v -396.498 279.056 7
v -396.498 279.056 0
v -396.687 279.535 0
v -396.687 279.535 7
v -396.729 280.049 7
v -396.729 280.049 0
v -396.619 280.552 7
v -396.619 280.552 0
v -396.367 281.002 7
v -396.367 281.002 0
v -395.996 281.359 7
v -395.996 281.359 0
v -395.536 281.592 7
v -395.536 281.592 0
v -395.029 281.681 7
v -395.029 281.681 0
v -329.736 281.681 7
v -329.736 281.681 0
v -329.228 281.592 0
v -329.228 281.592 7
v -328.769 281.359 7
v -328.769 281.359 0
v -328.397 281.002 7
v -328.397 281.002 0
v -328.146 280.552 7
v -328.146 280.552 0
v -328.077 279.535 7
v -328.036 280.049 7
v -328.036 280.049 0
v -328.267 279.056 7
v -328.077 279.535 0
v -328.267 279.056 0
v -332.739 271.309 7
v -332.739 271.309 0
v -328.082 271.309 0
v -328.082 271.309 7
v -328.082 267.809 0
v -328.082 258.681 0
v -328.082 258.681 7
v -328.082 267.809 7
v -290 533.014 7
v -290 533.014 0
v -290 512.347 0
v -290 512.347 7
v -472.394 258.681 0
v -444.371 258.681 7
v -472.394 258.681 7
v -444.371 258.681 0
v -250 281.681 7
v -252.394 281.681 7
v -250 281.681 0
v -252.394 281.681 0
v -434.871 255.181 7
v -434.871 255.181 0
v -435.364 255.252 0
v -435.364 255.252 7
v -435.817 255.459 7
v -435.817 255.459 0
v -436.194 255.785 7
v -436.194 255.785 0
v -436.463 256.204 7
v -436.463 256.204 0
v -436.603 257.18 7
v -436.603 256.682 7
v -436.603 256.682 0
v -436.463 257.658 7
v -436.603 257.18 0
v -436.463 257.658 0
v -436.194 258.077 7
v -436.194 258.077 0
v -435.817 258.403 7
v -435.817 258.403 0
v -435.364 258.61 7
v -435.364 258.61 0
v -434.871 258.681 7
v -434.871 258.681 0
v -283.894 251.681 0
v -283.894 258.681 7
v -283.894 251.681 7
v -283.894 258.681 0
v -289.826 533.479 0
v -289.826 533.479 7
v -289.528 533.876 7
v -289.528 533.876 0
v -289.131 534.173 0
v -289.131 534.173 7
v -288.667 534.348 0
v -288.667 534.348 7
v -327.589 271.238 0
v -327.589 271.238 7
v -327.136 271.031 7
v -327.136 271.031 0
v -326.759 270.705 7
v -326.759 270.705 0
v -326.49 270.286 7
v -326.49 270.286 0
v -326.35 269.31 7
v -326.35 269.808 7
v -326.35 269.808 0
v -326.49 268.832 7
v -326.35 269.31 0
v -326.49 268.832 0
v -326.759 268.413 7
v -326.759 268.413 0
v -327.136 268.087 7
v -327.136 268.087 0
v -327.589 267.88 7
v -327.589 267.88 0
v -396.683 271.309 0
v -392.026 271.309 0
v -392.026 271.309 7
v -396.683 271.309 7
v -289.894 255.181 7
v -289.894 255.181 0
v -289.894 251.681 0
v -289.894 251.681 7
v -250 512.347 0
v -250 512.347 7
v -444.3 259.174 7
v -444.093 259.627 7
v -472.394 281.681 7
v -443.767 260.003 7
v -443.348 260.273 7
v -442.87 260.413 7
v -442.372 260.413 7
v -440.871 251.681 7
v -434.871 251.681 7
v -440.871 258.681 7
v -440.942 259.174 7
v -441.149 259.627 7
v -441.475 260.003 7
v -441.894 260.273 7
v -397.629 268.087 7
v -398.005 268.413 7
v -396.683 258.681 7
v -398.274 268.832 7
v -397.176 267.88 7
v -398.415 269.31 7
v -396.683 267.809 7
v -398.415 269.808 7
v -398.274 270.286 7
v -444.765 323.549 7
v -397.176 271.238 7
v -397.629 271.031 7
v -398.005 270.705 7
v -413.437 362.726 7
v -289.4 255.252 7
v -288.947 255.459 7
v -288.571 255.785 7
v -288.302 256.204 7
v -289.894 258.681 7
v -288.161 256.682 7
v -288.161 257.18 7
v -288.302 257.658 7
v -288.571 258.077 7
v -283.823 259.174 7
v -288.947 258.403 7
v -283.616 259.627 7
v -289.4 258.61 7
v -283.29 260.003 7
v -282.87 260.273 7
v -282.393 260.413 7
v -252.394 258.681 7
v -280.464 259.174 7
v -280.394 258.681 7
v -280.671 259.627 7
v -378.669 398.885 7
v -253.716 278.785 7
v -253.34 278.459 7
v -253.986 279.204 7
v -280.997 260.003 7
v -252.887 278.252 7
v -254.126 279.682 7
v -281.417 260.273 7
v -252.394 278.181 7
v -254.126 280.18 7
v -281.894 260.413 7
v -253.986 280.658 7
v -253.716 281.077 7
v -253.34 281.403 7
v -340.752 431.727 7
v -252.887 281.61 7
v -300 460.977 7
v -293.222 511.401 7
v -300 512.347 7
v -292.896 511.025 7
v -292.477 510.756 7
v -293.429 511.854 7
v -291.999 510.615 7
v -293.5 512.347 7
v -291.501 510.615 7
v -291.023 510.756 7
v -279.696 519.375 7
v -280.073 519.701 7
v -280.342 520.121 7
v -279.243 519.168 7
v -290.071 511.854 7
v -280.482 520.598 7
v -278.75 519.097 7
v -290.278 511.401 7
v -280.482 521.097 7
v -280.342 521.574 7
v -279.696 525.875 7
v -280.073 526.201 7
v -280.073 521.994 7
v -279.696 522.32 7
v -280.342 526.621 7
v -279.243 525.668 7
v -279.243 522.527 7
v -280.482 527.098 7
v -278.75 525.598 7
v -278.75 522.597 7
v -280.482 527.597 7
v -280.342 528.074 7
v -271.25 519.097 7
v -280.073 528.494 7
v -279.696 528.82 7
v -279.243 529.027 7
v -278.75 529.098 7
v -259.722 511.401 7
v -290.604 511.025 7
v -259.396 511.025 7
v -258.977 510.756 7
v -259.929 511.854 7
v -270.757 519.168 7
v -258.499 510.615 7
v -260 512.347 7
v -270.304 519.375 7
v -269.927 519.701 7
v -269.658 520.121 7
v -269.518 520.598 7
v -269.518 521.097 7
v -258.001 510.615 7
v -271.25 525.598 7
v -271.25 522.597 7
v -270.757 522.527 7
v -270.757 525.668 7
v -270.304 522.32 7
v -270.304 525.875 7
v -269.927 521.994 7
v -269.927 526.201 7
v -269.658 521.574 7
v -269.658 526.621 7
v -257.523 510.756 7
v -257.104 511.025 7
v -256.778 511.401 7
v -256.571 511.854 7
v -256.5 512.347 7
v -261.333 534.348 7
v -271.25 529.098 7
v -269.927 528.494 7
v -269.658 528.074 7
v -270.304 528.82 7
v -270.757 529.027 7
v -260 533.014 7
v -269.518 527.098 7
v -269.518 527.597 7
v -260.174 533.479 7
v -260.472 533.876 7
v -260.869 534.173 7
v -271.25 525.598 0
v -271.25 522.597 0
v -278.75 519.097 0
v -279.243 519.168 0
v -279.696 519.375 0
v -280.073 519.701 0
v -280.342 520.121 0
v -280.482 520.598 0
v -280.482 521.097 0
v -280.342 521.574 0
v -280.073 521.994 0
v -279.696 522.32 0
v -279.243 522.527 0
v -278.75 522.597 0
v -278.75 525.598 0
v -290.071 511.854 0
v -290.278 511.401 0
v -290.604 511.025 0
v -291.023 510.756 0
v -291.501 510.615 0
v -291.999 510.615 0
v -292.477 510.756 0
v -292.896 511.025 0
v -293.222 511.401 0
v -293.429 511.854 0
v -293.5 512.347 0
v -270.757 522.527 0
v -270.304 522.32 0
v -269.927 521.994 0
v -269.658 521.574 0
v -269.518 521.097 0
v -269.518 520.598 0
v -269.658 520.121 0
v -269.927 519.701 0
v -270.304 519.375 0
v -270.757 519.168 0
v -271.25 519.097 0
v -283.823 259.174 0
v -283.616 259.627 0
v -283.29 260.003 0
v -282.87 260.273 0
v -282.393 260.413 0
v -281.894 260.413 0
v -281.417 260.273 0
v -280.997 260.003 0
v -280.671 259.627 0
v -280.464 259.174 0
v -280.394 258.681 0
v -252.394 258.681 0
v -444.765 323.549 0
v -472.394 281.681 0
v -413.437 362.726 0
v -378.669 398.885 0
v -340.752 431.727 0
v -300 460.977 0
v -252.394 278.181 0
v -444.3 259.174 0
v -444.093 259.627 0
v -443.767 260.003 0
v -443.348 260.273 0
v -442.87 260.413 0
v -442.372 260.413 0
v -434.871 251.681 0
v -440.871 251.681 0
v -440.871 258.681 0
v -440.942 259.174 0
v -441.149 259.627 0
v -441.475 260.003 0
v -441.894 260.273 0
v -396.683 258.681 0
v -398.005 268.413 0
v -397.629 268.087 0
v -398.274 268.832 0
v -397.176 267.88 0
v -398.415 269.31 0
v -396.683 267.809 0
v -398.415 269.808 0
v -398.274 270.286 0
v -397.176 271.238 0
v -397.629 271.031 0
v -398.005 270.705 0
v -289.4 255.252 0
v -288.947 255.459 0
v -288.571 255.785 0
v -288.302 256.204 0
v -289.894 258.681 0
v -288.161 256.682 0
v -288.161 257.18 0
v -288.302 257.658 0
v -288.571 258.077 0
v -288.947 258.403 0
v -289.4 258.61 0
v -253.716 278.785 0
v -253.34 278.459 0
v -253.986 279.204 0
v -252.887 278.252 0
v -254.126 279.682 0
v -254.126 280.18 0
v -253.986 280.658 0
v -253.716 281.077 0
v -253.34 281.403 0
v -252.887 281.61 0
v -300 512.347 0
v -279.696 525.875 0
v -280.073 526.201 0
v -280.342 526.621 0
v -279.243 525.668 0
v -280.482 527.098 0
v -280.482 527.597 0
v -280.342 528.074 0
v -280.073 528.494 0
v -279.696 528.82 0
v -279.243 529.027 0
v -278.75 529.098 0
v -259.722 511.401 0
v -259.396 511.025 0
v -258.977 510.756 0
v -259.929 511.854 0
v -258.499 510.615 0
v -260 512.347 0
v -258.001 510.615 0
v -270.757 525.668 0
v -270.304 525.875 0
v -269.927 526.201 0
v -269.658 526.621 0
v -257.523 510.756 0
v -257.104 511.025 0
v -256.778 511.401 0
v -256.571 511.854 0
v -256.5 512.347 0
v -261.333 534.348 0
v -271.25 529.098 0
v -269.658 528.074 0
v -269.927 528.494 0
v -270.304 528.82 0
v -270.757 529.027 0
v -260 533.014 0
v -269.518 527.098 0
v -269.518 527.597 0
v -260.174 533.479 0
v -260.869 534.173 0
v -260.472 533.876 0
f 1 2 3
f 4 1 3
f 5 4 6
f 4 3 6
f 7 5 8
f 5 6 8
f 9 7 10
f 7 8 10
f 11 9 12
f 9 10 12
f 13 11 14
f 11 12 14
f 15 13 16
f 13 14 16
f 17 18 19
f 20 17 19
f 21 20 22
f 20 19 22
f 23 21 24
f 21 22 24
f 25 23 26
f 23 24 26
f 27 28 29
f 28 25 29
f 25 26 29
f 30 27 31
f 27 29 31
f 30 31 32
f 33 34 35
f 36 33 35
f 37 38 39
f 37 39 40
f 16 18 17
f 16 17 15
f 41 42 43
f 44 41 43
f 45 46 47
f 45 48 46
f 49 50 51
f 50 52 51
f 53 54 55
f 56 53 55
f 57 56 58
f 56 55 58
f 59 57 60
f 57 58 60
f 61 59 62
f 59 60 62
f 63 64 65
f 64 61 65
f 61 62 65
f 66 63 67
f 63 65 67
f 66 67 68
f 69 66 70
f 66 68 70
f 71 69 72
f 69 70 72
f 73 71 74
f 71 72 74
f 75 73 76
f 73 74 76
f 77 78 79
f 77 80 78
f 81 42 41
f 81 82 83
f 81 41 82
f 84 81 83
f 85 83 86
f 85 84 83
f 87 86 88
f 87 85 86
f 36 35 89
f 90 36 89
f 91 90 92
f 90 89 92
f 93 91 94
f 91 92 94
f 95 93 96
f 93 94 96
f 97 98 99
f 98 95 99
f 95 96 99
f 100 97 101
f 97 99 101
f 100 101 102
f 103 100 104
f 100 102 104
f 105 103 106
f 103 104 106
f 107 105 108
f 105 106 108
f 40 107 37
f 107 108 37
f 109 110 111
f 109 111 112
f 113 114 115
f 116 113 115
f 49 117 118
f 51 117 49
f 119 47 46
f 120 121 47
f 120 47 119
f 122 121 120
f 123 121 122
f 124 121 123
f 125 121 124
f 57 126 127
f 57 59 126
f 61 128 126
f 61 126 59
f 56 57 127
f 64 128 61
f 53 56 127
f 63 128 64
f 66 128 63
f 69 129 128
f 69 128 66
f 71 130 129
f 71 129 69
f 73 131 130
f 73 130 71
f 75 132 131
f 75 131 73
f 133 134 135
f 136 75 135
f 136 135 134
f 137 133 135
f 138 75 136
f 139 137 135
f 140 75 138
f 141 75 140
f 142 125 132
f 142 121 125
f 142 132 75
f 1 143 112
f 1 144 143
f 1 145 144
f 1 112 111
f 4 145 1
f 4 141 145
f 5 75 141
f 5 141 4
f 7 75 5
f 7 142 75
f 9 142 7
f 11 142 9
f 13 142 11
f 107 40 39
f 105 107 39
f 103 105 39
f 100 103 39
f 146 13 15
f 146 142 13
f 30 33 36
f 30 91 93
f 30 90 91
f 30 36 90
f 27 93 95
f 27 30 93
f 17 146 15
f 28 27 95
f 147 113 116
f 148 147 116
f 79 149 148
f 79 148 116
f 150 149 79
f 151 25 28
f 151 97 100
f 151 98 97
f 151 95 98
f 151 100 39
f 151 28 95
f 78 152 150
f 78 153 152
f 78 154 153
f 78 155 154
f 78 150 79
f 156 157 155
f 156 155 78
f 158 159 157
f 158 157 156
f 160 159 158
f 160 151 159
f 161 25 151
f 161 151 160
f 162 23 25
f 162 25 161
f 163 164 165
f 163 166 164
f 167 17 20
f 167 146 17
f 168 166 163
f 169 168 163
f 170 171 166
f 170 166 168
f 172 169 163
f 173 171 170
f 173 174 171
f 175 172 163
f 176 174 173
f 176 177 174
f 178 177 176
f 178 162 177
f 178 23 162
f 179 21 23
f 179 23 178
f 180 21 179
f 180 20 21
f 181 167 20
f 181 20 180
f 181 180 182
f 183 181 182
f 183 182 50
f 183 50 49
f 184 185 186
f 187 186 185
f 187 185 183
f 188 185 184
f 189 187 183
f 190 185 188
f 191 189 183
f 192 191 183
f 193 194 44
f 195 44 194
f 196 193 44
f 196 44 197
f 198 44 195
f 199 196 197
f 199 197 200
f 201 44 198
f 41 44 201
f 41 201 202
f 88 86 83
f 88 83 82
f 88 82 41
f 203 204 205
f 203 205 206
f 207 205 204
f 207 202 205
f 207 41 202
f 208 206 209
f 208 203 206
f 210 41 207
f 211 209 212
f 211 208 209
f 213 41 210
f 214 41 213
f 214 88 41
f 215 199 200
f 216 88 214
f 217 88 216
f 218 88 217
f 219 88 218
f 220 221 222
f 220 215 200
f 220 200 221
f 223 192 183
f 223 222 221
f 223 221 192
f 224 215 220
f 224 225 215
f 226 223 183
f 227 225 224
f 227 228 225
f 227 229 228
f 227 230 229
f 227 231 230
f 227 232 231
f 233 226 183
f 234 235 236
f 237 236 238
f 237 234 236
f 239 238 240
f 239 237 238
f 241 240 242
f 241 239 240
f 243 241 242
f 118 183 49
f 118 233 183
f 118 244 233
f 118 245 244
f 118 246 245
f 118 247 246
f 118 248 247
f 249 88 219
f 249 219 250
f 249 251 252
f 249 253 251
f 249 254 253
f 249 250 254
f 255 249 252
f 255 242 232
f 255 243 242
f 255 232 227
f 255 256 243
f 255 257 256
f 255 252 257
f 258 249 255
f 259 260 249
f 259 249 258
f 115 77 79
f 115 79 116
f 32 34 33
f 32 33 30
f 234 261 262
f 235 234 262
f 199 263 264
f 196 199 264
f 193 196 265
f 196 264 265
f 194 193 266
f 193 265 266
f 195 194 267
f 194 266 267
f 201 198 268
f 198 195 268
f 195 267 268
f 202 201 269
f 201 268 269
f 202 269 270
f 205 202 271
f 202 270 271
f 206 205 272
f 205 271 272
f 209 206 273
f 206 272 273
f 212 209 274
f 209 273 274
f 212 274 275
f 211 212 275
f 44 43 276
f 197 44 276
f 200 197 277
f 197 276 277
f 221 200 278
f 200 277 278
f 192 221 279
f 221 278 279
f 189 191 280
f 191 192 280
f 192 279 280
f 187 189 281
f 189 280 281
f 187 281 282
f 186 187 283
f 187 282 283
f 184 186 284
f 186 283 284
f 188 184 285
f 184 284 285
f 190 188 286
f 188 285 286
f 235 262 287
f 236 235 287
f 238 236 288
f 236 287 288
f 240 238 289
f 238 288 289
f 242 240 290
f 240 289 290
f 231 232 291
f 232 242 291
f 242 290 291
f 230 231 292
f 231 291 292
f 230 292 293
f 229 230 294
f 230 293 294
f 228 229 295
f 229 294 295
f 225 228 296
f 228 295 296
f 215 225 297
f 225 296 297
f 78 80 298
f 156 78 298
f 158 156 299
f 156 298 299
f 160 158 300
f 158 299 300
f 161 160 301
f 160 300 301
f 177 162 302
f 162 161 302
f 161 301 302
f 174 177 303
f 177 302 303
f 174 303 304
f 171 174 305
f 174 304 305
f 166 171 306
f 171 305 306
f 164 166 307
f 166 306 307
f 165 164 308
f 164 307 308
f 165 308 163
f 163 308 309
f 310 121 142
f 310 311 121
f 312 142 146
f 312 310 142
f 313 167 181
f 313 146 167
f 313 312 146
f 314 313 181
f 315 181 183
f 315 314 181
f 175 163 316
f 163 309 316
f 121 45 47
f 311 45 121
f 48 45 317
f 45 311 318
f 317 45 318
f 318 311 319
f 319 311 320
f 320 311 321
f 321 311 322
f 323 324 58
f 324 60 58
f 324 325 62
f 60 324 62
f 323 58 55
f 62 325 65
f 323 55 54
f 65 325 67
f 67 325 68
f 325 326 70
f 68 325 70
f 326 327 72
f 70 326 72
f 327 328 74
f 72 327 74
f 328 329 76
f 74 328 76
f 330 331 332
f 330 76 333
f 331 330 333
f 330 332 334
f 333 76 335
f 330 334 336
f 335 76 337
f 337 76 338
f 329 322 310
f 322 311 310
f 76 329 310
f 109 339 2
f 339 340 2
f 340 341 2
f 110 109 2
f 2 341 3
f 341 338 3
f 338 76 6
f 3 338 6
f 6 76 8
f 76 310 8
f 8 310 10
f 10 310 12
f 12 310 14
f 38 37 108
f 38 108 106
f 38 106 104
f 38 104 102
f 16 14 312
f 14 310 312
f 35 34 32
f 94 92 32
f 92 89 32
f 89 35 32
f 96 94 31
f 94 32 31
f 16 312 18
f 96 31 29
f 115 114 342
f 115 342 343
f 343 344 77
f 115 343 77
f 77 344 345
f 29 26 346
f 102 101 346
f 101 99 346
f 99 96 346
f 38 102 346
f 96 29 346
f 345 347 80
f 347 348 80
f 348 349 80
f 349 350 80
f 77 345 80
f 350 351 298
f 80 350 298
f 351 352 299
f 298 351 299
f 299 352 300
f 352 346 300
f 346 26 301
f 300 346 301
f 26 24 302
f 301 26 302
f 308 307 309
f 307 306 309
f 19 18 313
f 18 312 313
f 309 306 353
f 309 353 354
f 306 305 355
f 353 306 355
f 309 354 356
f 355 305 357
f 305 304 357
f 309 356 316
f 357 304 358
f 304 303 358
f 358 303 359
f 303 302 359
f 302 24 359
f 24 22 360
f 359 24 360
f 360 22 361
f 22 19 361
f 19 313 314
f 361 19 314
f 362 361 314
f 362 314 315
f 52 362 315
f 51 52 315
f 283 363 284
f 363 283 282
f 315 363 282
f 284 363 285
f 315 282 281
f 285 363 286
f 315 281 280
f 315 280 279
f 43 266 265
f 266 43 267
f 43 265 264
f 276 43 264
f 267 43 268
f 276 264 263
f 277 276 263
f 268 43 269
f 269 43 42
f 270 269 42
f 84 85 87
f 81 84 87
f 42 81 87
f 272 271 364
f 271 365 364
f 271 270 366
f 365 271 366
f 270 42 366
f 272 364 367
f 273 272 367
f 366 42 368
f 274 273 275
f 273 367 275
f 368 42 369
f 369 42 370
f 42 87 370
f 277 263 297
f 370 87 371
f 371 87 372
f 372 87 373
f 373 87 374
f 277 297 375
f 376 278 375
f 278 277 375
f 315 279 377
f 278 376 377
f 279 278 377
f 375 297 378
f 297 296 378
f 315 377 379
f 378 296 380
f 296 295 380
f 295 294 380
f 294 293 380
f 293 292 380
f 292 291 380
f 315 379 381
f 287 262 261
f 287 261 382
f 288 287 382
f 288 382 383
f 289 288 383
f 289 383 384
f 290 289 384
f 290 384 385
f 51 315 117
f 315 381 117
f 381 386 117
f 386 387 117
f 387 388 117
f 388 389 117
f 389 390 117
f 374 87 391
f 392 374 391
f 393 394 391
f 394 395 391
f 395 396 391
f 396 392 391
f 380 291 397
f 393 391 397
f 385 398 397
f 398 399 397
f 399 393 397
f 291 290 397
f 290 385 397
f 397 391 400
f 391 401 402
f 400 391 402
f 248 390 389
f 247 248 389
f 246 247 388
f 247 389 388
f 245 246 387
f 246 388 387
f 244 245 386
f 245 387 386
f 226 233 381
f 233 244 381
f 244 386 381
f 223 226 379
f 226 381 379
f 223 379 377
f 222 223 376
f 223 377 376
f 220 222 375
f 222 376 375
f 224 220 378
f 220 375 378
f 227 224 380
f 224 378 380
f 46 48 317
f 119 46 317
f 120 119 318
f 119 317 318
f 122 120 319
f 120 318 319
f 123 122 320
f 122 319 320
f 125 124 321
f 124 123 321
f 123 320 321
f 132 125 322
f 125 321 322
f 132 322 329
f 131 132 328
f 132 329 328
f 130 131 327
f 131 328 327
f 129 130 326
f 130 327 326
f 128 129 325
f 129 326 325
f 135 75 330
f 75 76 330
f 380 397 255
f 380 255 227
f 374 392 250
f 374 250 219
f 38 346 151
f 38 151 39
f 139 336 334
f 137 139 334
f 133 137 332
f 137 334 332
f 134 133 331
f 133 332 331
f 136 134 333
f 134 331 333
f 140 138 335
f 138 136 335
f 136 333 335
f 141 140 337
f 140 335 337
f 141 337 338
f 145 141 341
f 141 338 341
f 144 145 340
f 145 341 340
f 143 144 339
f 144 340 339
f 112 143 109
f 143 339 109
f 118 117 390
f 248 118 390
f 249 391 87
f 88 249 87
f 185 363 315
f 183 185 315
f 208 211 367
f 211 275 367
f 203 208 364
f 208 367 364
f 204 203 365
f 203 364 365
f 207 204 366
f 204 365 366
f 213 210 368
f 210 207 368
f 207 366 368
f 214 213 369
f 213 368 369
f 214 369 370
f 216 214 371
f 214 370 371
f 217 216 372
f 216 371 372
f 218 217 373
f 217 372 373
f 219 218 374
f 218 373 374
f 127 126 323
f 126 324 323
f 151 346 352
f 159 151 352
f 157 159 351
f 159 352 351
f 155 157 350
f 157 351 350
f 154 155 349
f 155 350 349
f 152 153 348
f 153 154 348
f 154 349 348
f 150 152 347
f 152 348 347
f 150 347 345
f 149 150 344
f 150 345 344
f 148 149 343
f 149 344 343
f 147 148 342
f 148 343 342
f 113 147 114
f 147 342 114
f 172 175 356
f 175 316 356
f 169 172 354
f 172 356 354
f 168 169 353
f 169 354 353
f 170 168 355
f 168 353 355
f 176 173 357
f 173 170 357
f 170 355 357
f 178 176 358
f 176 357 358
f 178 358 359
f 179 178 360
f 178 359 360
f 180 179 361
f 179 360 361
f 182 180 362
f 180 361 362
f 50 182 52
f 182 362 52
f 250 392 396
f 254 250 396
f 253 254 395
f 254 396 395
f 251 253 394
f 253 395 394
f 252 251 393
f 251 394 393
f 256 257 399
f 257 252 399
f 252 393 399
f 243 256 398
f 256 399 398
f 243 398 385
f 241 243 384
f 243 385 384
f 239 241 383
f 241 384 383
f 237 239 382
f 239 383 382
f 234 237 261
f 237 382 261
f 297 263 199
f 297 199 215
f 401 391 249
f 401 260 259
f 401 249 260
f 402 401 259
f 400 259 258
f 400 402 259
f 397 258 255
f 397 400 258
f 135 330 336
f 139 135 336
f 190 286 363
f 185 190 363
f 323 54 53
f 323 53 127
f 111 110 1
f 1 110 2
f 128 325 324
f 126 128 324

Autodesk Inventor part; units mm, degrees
ref_plane "YZ Plane" through (0, 0, 0) normal (1, 0, 0) x (0, 1, 0)
ref_plane "XZ Plane" through (0, 0, 0) normal (0, 1, 0) x (-1, 0, 0)
ref_plane "XY Plane" through (0, 0, 0) normal (0, 0, 1) x (1, 0, 0)
sketch "Sketch1" plane through (0, 0, 0) normal (0, 0, 1) x (1, 0, 0)
  line L0 (-150, -512.3475) -> (-150, -323.3356) construction
  line L1 (-472.3938, -281.6809) -> (-252.3938, -281.6809) construction
  line L2 (-489.0365, 251.6809) -> (-252.3938, 251.6809) construction
  line L3 (-472.3938, 281.6809) -> (-252.3938, 281.6809) construction
  line L4 (-472.3938, -251.6809) -> (-252.3938, -251.6809) construction
  line L5 (-356.435, 15) -> (-576.435, 15) construction
  line L6 (-472.3938, -281.6809) -> (-472.3938, -251.6809) construction
  line L7 (-252.3938, -281.6809) -> (-252.3938, -251.6809) construction
  line L8 (-252.3938, 278.1809) -> (-252.3938, 251.6809) construction
  line L9 (-472.3938, 281.6809) -> (-472.3938, 251.6809) construction
  line L10 (-356.435, 15) -> (-356.435, -15) construction
  line L11 (-356.435, -15) -> (-576.435, -15) construction
  line L12 (-576.435, -15) -> (-576.435, 15) construction
  arc A0 (-150, -323.3356) -> (0, -356.435) centre (0, 0) ccw construction
  arc A1 (-156.5, -512.3475) -> (-160, -512.3475) centre (-158.25, -512.3475) ccw construction
  arc A2 (-190, -512.3475) -> (-193.5, -512.3475) centre (-191.75, -512.3475) ccw construction
  line L13 (-178.75, -519.0975) -> (-175, -519.0975) construction
  line L14 (-178.75, -529.0975) -> (-175, -529.0975) construction
  line L15 (-175, -519.0975) -> (-175, -529.0975) construction
  arc A3 (-178.75, -519.0975) -> (-178.75, -522.5975) centre (-178.75, -520.8475) ccw construction
  arc A4 (-178.75, -525.5975) -> (-178.75, -529.0975) centre (-178.75, -527.3475) ccw construction
  line L16 (-171.25, -519.0975) -> (-175, -519.0975) construction
  line L17 (-171.25, -529.0975) -> (-175, -529.0975) construction
  arc A5 (-171.25, -522.5975) -> (-171.25, -519.0975) centre (-171.25, -520.8475) ccw construction
  arc A6 (-171.25, -529.0975) -> (-171.25, -525.5975) centre (-171.25, -527.3475) ccw construction
  line L18 (-252.3938, 251.6809) -> (-489.0365, 251.6809) construction
  arc A7 (-334.9122, -265.623) -> (-335.582, -268.123) centre (-330.582, -268.123) ccw construction
  line L19 (-328.3782, -254.3059) -> (-334.9122, -265.623) construction
  arc A8 (-328.3782, -254.3059) -> (-329.8938, -251.6809) centre (-329.8938, -253.4309) ccw construction
  line L20 (-329.8938, -251.6809) -> (-394.8938, -251.6809) construction
  line L21 (-362.3938, -251.6809) -> (-362.3938, -293.6041) construction
  arc A9 (-389.2055, -268.123) -> (-389.8754, -265.623) centre (-394.2055, -268.123) ccw construction
  arc A10 (-394.8938, -251.6809) -> (-396.4093, -254.3059) centre (-394.8938, -253.4309) ccw construction
  line L22 (-396.4093, -254.3059) -> (-389.8754, -265.623) construction
  arc A11 (-389.2055, -291.6809) -> (-389.2055, -288.1809) centre (-389.2055, -289.9309) ccw construction
  line L23 (-389.2055, -291.6809) -> (-396.7055, -291.6809) construction
  line L24 (-396.7055, -281.6809) -> (-472.3938, -281.6809) construction
  line L25 (-328.082, -281.6809) -> (-252.3938, -281.6809) construction
  line L26 (-252.3938, -287.3475) -> (-210.8964, -287.3475) construction
  arc A12 (-210.8964, -287.3475) -> (-150, -323.3356) centre (0, 0) ccw construction
  arc A13 (-472.3938, -281.6809) -> (-246.475, -491.6809) centre (0, 0) ccw construction
  line L27 (-171.25, -436.0915) -> (-171.25, -399.5915) construction
  line L28 (-178.75, -436.0915) -> (-178.75, -399.5915) construction
  line L29 (-177, -437.8415) -> (-173, -437.8415) construction
  line L30 (-177, -397.8415) -> (-173, -397.8415) construction
  arc A14 (-177, -397.8415) -> (-178.75, -399.5915) centre (-177, -399.5915) ccw construction
  arc A15 (-178.75, -436.0915) -> (-177, -437.8415) centre (-177, -436.0915) ccw construction
  arc A16 (-173, -437.8415) -> (-171.25, -436.0915) centre (-173, -436.0915) ccw construction
  arc A17 (-171.25, -399.5915) -> (-173, -397.8415) centre (-173, -399.5915) ccw construction
  line L31 (-200, -512.3475) -> (-200, -491.6809) construction
  arc A18 (-200, -491.6809) -> (-203.5, -491.6809) centre (-201.75, -491.6809) ccw construction
  line L32 (-160, -512.3475) -> (-160, -532.5975) construction
  line L33 (-161.75, -534.3475) -> (-188.25, -534.3475) construction
  line L34 (-190, -532.5975) -> (-190, -512.3475) construction
  line L35 (-171.25, -522.5975) -> (-171.25, -525.5975) construction
  line L36 (-178.75, -522.5975) -> (-178.75, -525.5975) construction
  arc A19 (-190, -532.5975) -> (-188.25, -534.3475) centre (-188.25, -532.5975) ccw construction
  arc A20 (-161.75, -534.3475) -> (-160, -532.5975) centre (-161.75, -532.5975) ccw construction
  line L37 (-156.5, -512.3475) -> (-150, -512.3475) construction
  line L38 (-193.5, -512.3475) -> (-200, -512.3475) construction
  line L39 (-203.5, -491.6809) -> (-246.475, -491.6809) construction
  arc A21 (-396.7055, -288.1809) -> (-396.7055, -291.6809) centre (-396.7055, -289.9309) ccw construction
  line L40 (-396.7055, -281.6809) -> (-396.7055, -288.1809) construction
  line L41 (-389.2055, -288.1809) -> (-389.2055, -268.123) construction
  arc A22 (-335.582, -288.1809) -> (-335.582, -291.6809) centre (-335.582, -289.9309) ccw construction
  line L42 (-335.582, -291.6809) -> (-328.082, -291.6809) construction
  arc A23 (-328.082, -291.6809) -> (-328.082, -288.1809) centre (-328.082, -289.9309) ccw construction
  line L43 (-328.082, -281.6809) -> (-328.082, -288.1809) construction
  line L44 (-335.582, -288.1809) -> (-335.582, -268.123) construction
  arc A24 (-252.3938, -283.8475) -> (-252.3938, -287.3475) centre (-252.3938, -285.5975) ccw construction
  line L45 (-252.3938, -283.8475) -> (-252.3938, -281.6809) construction
  arc A25 (-479.7691, -25) -> (-479.7691, -21.5) centre (-479.7691, -23.25) ccw construction
  arc A26 (-479.7691, -1.4421) -> (-480.4389, 1.0579) centre (-484.7691, -1.4421) ccw construction
  line L46 (-486.9729, 12.375) -> (-480.4389, 1.0579) construction
  arc A27 (-485.4573, 15) -> (-486.9729, 12.375) centre (-485.4573, 13.25) ccw construction
  line L47 (-420.4573, 15) -> (-485.4573, 15) construction
  arc A28 (-425.4757, 1.0579) -> (-426.1456, -1.4421) centre (-421.1456, -1.4421) ccw construction
  arc A29 (-418.9418, 12.375) -> (-420.4573, 15) centre (-420.4573, 13.25) ccw construction
  line L48 (-418.9418, 12.375) -> (-425.4757, 1.0579) construction
  line L49 (-452.9573, 15) -> (-452.9573, -26.9232) construction
  line L50 (-479.7691, -25) -> (-487.2691, -25) construction
  line L51 (-487.2691, -15) -> (-549.7954, -15) construction
  arc A30 (-487.2691, -21.5) -> (-487.2691, -25) centre (-487.2691, -23.25) ccw construction
  line L52 (-487.2691, -15) -> (-487.2691, -21.5) construction
  line L53 (-479.7691, -21.5) -> (-479.7691, -1.4421) construction
  line L54 (-426.1456, -21.5) -> (-426.1456, -1.4421) construction
  arc A31 (-426.1456, -21.5) -> (-426.1456, -25) centre (-426.1456, -23.25) ccw construction
  line L55 (-426.1456, -25) -> (-418.6456, -25) construction
  arc A32 (-418.6456, -25) -> (-418.6456, -21.5) centre (-418.6456, -23.25) ccw construction
  line L56 (-418.6456, -15) -> (-418.6456, -21.5) construction
  line L57 (276.2049, -135.3556) -> (280.6774, -127.609)
  line L58 (279.2083, -124.984) -> (246.5502, -124.984)
  arc A33 (319.0505, -151.484) -> (319.0505, -147.984) centre (319.0505, -149.734) ccw
  arc A34 (328.5505, -147.9841) -> (325.0505, -147.9841) centre (326.8005, -147.9841) ccw
  line L59 (319.0505, -147.984) -> (280.8619, -147.984)
  arc A35 (214.0502, -164.7817) -> (212.5346, -167.4067) centre (214.0502, -166.5317) ccw
  arc A36 (280.5657, -167.4067) -> (279.0502, -164.7817) centre (279.0502, -166.5317) ccw
  arc A37 (274.0318, -178.7238) -> (273.3619, -181.2238) centre (278.3619, -181.2238) ccw
  line L60 (280.5657, -167.4067) -> (274.0318, -178.7238)
  line L61 (273.3619, -201.2817) -> (273.3619, -181.2238)
  arc A38 (273.3619, -201.2817) -> (273.3619, -204.7817) centre (273.3619, -203.0317) ccw
  line L62 (273.3619, -204.7817) -> (280.8619, -204.7817)
  arc A39 (280.8619, -204.7817) -> (280.8619, -201.2817) centre (280.8619, -203.0317) ccw
  line L63 (280.8619, -194.7817) -> (280.8619, -201.2817)
  line L64 (212.2384, -194.7817) -> (212.2384, -201.2817)
  arc A40 (212.2384, -201.2817) -> (212.2384, -204.7817) centre (212.2384, -203.0317) ccw
  arc A41 (219.7384, -204.7817) -> (219.7384, -201.2817) centre (219.7384, -203.0317) ccw
  line L65 (279.0502, -164.7817) -> (214.0502, -164.7817)
  line L66 (219.7384, -201.2817) -> (219.7384, -181.2238)
  line L67 (219.7384, -204.7817) -> (212.2384, -204.7817)
  arc A42 (219.7384, -181.2238) -> (219.0686, -178.7238) centre (214.7384, -181.2238) ccw
  line L68 (212.5346, -167.4067) -> (219.0686, -178.7238)
  line L69 (212.2384, -194.7817) -> (136.5502, -194.7817)
  line L70 (280.8619, -194.7817) -> (356.5502, -194.7817)
  line L71 (325.0505, -147.9841) -> (325.0505, -154.9841)
  line L72 (325.0505, -154.9841) -> (319.0505, -154.9841)
  line L73 (319.0505, -151.484) -> (319.0505, -154.9841)
  line L74 (246.5502, -124.984) -> (246.5502, -110.6064)
  arc A43 (280.6774, -127.609) -> (279.2083, -124.984) centre (279.1622, -126.7334) ccw
  arc A44 (280.8619, -138.8556) -> (280.8619, -135.3556) centre (280.8619, -137.1056) ccw
  line L75 (276.2049, -135.3556) -> (280.8619, -135.3556)
  line L76 (246.5502, -164.7817) -> (246.5502, -170.2759)
  line L77 (280.8619, -147.984) -> (280.8619, -138.8556)
  arc A45 (168.0499, -147.9841) -> (164.5499, -147.9841) centre (166.2999, -147.9841) ccw
  arc A46 (174.0499, -147.984) -> (174.0499, -151.484) centre (174.0499, -149.734) ccw
  line L78 (213.8921, -124.984) -> (246.5502, -124.984)
  line L79 (174.0499, -147.984) -> (212.2384, -147.984)
  line L80 (216.8955, -135.3556) -> (212.423, -127.609)
  line L81 (168.0499, -147.9841) -> (168.0499, -154.9841)
  line L82 (168.0499, -154.9841) -> (174.0499, -154.9841)
  line L83 (174.0499, -151.484) -> (174.0499, -154.9841)
  arc A47 (213.8921, -124.984) -> (212.423, -127.609) centre (213.9382, -126.7334) ccw
  arc A48 (212.2384, -135.3556) -> (212.2384, -138.8556) centre (212.2384, -137.1056) ccw
  line L84 (216.8955, -135.3556) -> (212.2384, -135.3556)
  line L85 (212.2384, -147.984) -> (212.2384, -138.8556)
  arc A49 (-280.3963, -274.7808) -> (-283.8935, -274.681) centre (-282.1435, -274.681) ccw construction
  arc A50 (-289.8935, -278.1809) -> (-289.8935, -274.6809) centre (-289.8935, -276.4309) ccw construction
  line L86 (-329.7357, -251.6809) -> (-362.3938, -251.6809) construction
  line L87 (-289.8935, -274.6809) -> (-328.082, -274.6809) construction
  line L88 (-332.7391, -262.0525) -> (-328.2666, -254.3059) construction
  line L89 (-283.8935, -274.681) -> (-283.8935, -281.681) construction
  line L90 (-283.8935, -281.681) -> (-289.8935, -281.681) construction
  line L91 (-289.8935, -278.1809) -> (-289.8935, -281.681) construction
  arc A51 (-328.2666, -254.3059) -> (-329.7357, -251.6809) centre (-329.7818, -253.4303) ccw construction
  arc A52 (-328.082, -265.5525) -> (-328.082, -262.0525) centre (-328.082, -263.8025) ccw construction
  line L92 (-332.7391, -262.0525) -> (-328.082, -262.0525) construction
  line L93 (-328.082, -274.6809) -> (-328.082, -265.5525) construction
  line L94 (-392.0485, -262.0525) -> (-396.7055, -262.0525) construction
  arc A53 (-396.7055, -262.0525) -> (-396.7055, -265.5525) centre (-396.7055, -263.8025) ccw construction
  line L95 (-392.0485, -262.0525) -> (-396.521, -254.3059) construction
  arc A54 (-395.0519, -251.6809) -> (-396.521, -254.3059) centre (-395.0058, -253.4303) ccw construction
  line L96 (-396.7055, -274.6809) -> (-396.7055, -265.5525) construction
  line L97 (-434.8941, -278.1809) -> (-434.8941, -281.681) construction
  line L98 (-434.8941, -274.6809) -> (-396.7055, -274.6809) construction
  arc A55 (-434.8941, -274.6809) -> (-434.8941, -278.1809) centre (-434.8941, -276.4309) ccw construction
  line L99 (-440.8941, -281.681) -> (-434.8941, -281.681) construction
  line L100 (-440.8941, -274.681) -> (-440.8941, -281.681) construction
  arc A56 (-440.8941, -274.681) -> (-444.3912, -274.7808) centre (-442.6441, -274.681) ccw construction
  line L101 (-395.0519, -251.6809) -> (-362.3938, -251.6809) construction
  line L102 (-444.3912, -274.7808) -> (-476.4404, -274.7808) construction
  arc A57 (-355.7859, -21.5) -> (-227.0273, -274.7808) centre (0, 0) ccw construction
  arc A58 (-549.7954, -15) -> (-476.4404, -274.7808) centre (0, 0) ccw construction
  line L103 (-280.3963, -274.7808) -> (-227.0273, -274.7808) construction
  line L104 (-364.1192, -15) -> (-364.1192, -18) construction
  arc A59 (-364.1192, -18) -> (-364.1192, -21.5) centre (-364.1192, -19.75) ccw construction
  line L105 (-364.1192, -21.5) -> (-355.7859, -21.5) construction
  line L106 (-356.1192, -15) -> (-356.435, -15) construction
  line L107 (-364.1192, -15) -> (-549.7954, -15) construction
  line L108 (-418.6456, -15) -> (-364.1192, -15) construction
  arc A60 (-370.957, -8.0002) -> (-374.457, -8.0002) centre (-372.707, -8.0002) ccw construction
  arc A61 (-380.457, -11.5) -> (-380.457, -8) centre (-380.457, -9.75) ccw construction
  line L109 (-420.2992, 15) -> (-452.9573, 15) construction
  line L110 (-380.457, -8) -> (-418.6456, -8) construction
  line L111 (-423.3026, 4.6284) -> (-418.8301, 12.375) construction
  line L112 (-374.457, -8.0002) -> (-374.457, -15.0002) construction
  line L113 (-374.457, -15.0002) -> (-380.457, -15.0002) construction
  line L114 (-380.457, -11.5) -> (-380.457, -15.0002) construction
  line L115 (-452.9573, 15) -> (-452.9573, 29.3776) construction
  arc A62 (-418.8301, 12.375) -> (-420.2992, 15) centre (-420.3453, 13.2506) ccw construction
  arc A63 (-418.6456, 1.1284) -> (-418.6456, 4.6284) centre (-418.6456, 2.8784) ccw construction
  line L116 (-423.3026, 4.6284) -> (-418.6456, 4.6284) construction
  line L117 (-418.6456, -8) -> (-418.6456, 1.1284) construction
  line L118 (-482.612, 4.6284) -> (-487.2691, 4.6284) construction
  arc A64 (-487.2691, 4.6284) -> (-487.2691, 1.1284) centre (-487.2691, 2.8784) ccw construction
  line L119 (-482.612, 4.6284) -> (-487.0845, 12.375) construction
  arc A65 (-485.6154, 15) -> (-487.0845, 12.375) centre (-485.5693, 13.2506) ccw construction
  line L120 (-487.2691, -8) -> (-487.2691, 1.1284) construction
  line L121 (-525.4576, -11.5) -> (-525.4576, -15.0002) construction
  line L122 (-525.4576, -8) -> (-487.2691, -8) construction
  arc A66 (-525.4576, -8) -> (-525.4576, -11.5) centre (-525.4576, -9.75) ccw construction
  line L123 (-531.4576, -15.0002) -> (-525.4576, -15.0002) construction
  line L124 (-531.4576, -8.0002) -> (-531.4576, -15.0002) construction
  arc A67 (-531.4576, -8.0002) -> (-534.9576, -8.0002) centre (-533.2076, -8.0002) ccw construction
  line L125 (-485.6154, 15) -> (-452.9573, 15) construction
  line L126 (-370.957, -8.0002) -> (-356.3452, -8.0002) construction
  line L127 (-534.9576, -8.0002) -> (-549.9418, -8.0002) construction
  line L128 (-328.082, 251.6809) -> (-328.082, 245.1809) construction
  arc A68 (-328.082, 241.6809) -> (-328.082, 245.1809) centre (-328.082, 243.4309) ccw construction
  line L129 (-396.7055, 251.6809) -> (-396.7055, 245.1809) construction
  arc A69 (-396.7055, 245.1809) -> (-396.7055, 241.6809) centre (-396.7055, 243.4309) ccw construction
  arc A70 (-389.2055, 241.6809) -> (-389.2055, 245.1809) centre (-389.2055, 243.4309) ccw construction
  line L130 (-389.2055, 245.1809) -> (-389.2055, 265.2388) construction
  line L131 (-389.2055, 241.6809) -> (-396.7055, 241.6809) construction
  arc A71 (-389.2055, 265.2388) -> (-389.8754, 267.7388) centre (-394.2055, 265.2388) ccw construction
  line L132 (-396.4093, 279.0559) -> (-389.8754, 267.7388) construction
  arc A72 (-394.8938, 281.6809) -> (-396.4093, 279.0559) centre (-394.8938, 279.9309) ccw construction
  line L133 (-329.8938, 281.6809) -> (-394.8938, 281.6809) construction
  arc A73 (-334.9122, 267.7388) -> (-335.582, 265.2388) centre (-330.582, 265.2388) ccw construction
  arc A74 (-328.3782, 279.0559) -> (-329.8938, 281.6809) centre (-329.8938, 279.9309) ccw construction
  line L134 (-328.3782, 279.0559) -> (-334.9122, 267.7388) construction
  arc A75 (-335.582, 245.1809) -> (-335.582, 241.6809) centre (-335.582, 243.4309) ccw construction
  line L135 (-335.582, 241.6809) -> (-328.082, 241.6809) construction
  line L136 (-335.582, 245.1809) -> (-335.582, 265.2388) construction
  line L137 (-328.082, 251.6809) -> (-252.3938, 251.6809) construction
  line L138 (-396.7055, 251.6809) -> (-472.3938, 251.6809) construction
  line L139 (-362.3938, 281.6809) -> (-362.3938, 276.1867) construction
  line L140 (-472.3938, 251.6809) -> (-472.3938, 248.6809) construction
  arc A76 (-472.3938, 245.1809) -> (-472.3938, 248.6809) centre (-472.3938, 246.9309) ccw construction
  line L141 (-472.3938, 245.1809) -> (-492.3275, 245.1809) construction
  arc A77 (-492.3275, 245.1809) -> (-549.7954, 15) centre (0, 0) ccw construction
  arc A78 (-252.3938, 251.6809) -> (-356.3452, -8.0002) centre (0, 0) ccw construction
  line L142 (-549.7954, 15) -> (-576.435, 15) construction
  line L143 (-576.435, 15) -> (-576.435, -8.0002) construction
  line L144 (-549.9418, -8.0002) -> (-576.435, -8.0002) construction
  arc A79 (-280.3935, 258.6807) -> (-283.8935, 258.6807) centre (-282.1435, 258.6807) ccw
  arc A80 (-289.8935, 255.1809) -> (-289.8935, 258.6809) centre (-289.8935, 256.9309) ccw
  line L145 (-329.7357, 281.6809) -> (-362.3823, 281.6809)
  line L146 (-289.8935, 258.6809) -> (-328.082, 258.6809)
  line L147 (-332.7391, 271.3093) -> (-328.2666, 279.0559)
  line L148 (-283.8935, 258.6807) -> (-283.8935, 251.6807)
  line L149 (-283.8935, 251.6807) -> (-289.8935, 251.6807)
  line L150 (-289.8935, 255.1809) -> (-289.8935, 251.6807)
  line L151 (-362.3823, 281.6809) -> (-362.3823, 296.0585)
  arc A81 (-328.2666, 279.0559) -> (-329.7357, 281.6809) centre (-329.7818, 279.9315) ccw
  arc A82 (-328.082, 267.8093) -> (-328.082, 271.3093) centre (-328.082, 269.5593) ccw
  line L152 (-332.7391, 271.3093) -> (-328.082, 271.3093)
  line L153 (-328.082, 258.6809) -> (-328.082, 267.8093)
  line L154 (-392.0255, 271.3093) -> (-396.6826, 271.3093)
  arc A83 (-396.6826, 271.3093) -> (-396.6826, 267.8093) centre (-396.6826, 269.5593) ccw
  line L155 (-392.0255, 271.3093) -> (-396.498, 279.0559)
  arc A84 (-395.0289, 281.6809) -> (-396.498, 279.0559) centre (-394.9828, 279.9315) ccw
  line L156 (-396.6826, 258.6809) -> (-396.6826, 267.8093)
  line L157 (-434.8711, 255.1809) -> (-434.8711, 251.6807)
  line L158 (-434.8711, 258.6809) -> (-396.6826, 258.6809)
  arc A85 (-434.8711, 258.6809) -> (-434.8711, 255.1809) centre (-434.8711, 256.9309) ccw
  line L159 (-440.8711, 251.6807) -> (-434.8711, 251.6807)
  line L160 (-440.8711, 258.6807) -> (-440.8711, 251.6807)
  arc A86 (-440.8711, 258.6807) -> (-444.3711, 258.6807) centre (-442.6211, 258.6807) ccw
  line L161 (-395.0289, 281.6809) -> (-362.3823, 281.6809)
  line L162 (-444.3711, 258.6807) -> (-472.3938, 258.6807)
  line L163 (-280.3935, 258.6807) -> (-252.3938, 258.6807)
  line L164 (-252.3938, 258.6807) -> (-252.3938, 278.1809)
  line L165 (-252.3938, 281.6809) -> (-218.4073, 281.6809)
  arc A87 (-252.3938, 281.6809) -> (-252.3938, 278.1809) centre (-252.3938, 279.9309) ccw
  arc A88 (-271.25, 519.0975) -> (-271.25, 522.5975) centre (-271.25, 520.8475) ccw
  line L166 (-271.25, 519.0975) -> (-275, 519.0975)
  arc A89 (-271.25, 525.5975) -> (-271.25, 529.0975) centre (-271.25, 527.3475) ccw
  line L167 (-278.75, 519.0975) -> (-275, 519.0975)
  line L168 (-271.25, 529.0975) -> (-275, 529.0975)
  line L169 (-275, 519.0975) -> (-275, 529.0975)
  line L170 (-278.75, 529.0975) -> (-275, 529.0975)
  line L171 (-275, 534.3475) -> (-275, 537.9358)
  line L172 (-261.3333, 534.3475) -> (-288.6667, 534.3475)
  arc A90 (-260, 512.3475) -> (-256.5, 512.3475) centre (-258.25, 512.3475) ccw
  arc A91 (-293.5, 512.3475) -> (-290, 512.3475) centre (-291.75, 512.3475) ccw
  arc A92 (-278.75, 522.5975) -> (-278.75, 519.0975) centre (-278.75, 520.8475) ccw
  arc A93 (-278.75, 529.0975) -> (-278.75, 525.5975) centre (-278.75, 527.3475) ccw
  arc A94 (-288.6667, 534.3475) -> (-290, 533.0142) centre (-288.2908, 532.6384) ccw
  arc A95 (-260, 533.0142) -> (-261.3333, 534.3475) centre (-261.7092, 532.6384) ccw
  arc A96 (-291.7627, 515.4872) -> (-291.9051, 515.4342) centre (-100, 0) ccw
  line L173 (-250, 512.3475) -> (-250, 281.6809)
  line L174 (-300, 512.3475) -> (-300, 460.9772)
  arc A97 (-300, 460.9772) -> (-472.3938, 281.6809) centre (0, 0) ccw
  line L175 (-219.7787, 527.0975) -> (-219.7787, 529.0975)
  line L176 (-250, 512.3475) -> (-256.5, 512.3475)
  line L177 (-293.5, 512.3475) -> (-300, 512.3475)
  line L178 (-260, 533.0142) -> (-260, 512.3475)
  line L179 (-290, 533.0142) -> (-290, 512.3475)
  line L180 (-278.75, 522.5975) -> (-278.75, 525.5975)
  line L181 (-271.25, 525.5975) -> (-271.25, 522.5975)
  line L182 (-472.3938, 258.6807) -> (-472.3938, 281.6809)
  arc A98 (-485.3702, 258.6809) -> (-485.3703, 258.6807) centre (0, 0) ccw
  line L183 (-247.8856, -513.2316) -> (-248.7643, -288.2333) projected
  line L184 (-251.1802, -282.576) -> (-326.8679, -282.8716) projected
  point P0 (0, -512.3475)
  point P1 (-190, -534.3475)
  point P2 (-160, -534.3475)
  point P3 (-59.9119, -534.1417)
  point P4 (-389.2055, -259.0142)
  point P5 (-479.7691, 7.6667)
  point P6 (328.5476, -148.0839)
  point P7 (328.0311, -152.0673)
  point P8 (329.3645, -149.3173)
  point P9 (219.7384, -172.1151)
  point P10 (164.5527, -148.0839)
  point P11 (165.0692, -152.0673)
  point P12 (163.7359, -149.3173)
  point P13 (-280.9128, -278.7642)
  point P14 (-279.5795, -276.0142)
  point P15 (-443.8747, -278.7642)
  point P16 (-445.2081, -276.0142)
  point P17 (-370.9599, -8.1)
  point P18 (-371.4764, -12.0833)
  point P19 (-370.143, -9.3333)
  point P20 (-534.4382, -12.0833)
  point P21 (-534.9548, -8.1)
  point P22 (-535.7716, -9.3333)
  point P23 (-389.2055, 274.3475)
  point P24 (-280.3733, 258.5809)
  point P25 (-280.8899, 254.5975)
  point P26 (-279.5565, 257.3475)
  point P27 (-443.8747, 254.5975)
  point P28 (-444.3912, 258.5809)
  point P29 (-445.2081, 257.3475)
  point P30 (-290, 534.3475)
  point P31 (-260, 534.3475)
  dimension "d19" = 150
  dimension "d54" = 220
  dimension "d56" = 220
  dimension "d57" = 30
  dimension "d59" = 30
  dimension "d73" = 236.6809
  dimension "d74" = 236.6809
  dimension "d75" = 576.435
  dimension "d76" = 472.3938
  dimension "d77" = 472.3938
  dimension "d78" = 30
  dimension "d82" = 252.3938
  dimension "d85" = 356.435
  dimension "d88" = 3.5
  dimension "d89" = 30
  dimension "d90" = 22
  dimension "d91" = 3.5
  dimension "d103" = 3.75
  dimension "d104" = 3.75
  dimension "d134" = 3.5
  dimension "d135" = 65
  dimension "d136" = 65
  dimension "d137" = 7.3333
  dimension "d138" = 60
  dimension "d139" = 5
  dimension "d140" = 7.5
  dimension "d148" = 1.75
  dimension "d151" = 40
  dimension "d152" = 74.506
  dimension "d153" = 20.6667
  dimension "d154" = 3.5
  dimension "d155" = 189.012
  dimension "d159" = 1.75
  dimension "d160" = 1.75
  dimension "d161" = 1.75
  dimension "d164" = 7.5
  dimension "d168" = 21.25
  dimension "d170" = 30
  dimension "d171" = 1.75
  dimension "d172" = 10
  dimension "d173" = 3.5
  dimension "d177" = 3.5
  dimension "d178" = 65
  dimension "d179" = 65
  dimension "d180" = 7.3333
  dimension "d181" = 60
  dimension "d182" = 5
  dimension "d183" = 7.5
  dimension "d185" = 1.75
  dimension "d186" = 10
  dimension "d192" = 1.75
  dimension "d206" = 1.75
  dimension "d208" = 220
  dimension "d209" = 3.5
  dimension "d210" = 65
  dimension "d211" = 65
  dimension "d212" = 7.3333
  dimension "d213" = 60
  dimension "d214" = 5
  dimension "d215" = 7.5
  dimension "d216" = 30
  dimension "d217" = 1.75
  dimension "d218" = 10
  dimension "d219" = 7
extrude "Extrusion4" add sketch "Sketch1" along normal blind 7 contours A79 L148 L149 L150 A80 L146 L153 A82 L152 L147 A81 L145 L161 A84 L155 L154 A83 L156 L158 A85 L157 L159 L160 A86 L162 L182 A97 A98 L173 L165 A87 L164 L163 | A98 L174 L177 A91 L179 A94 L172 A95 L178 A90 L176 L173
properties part number "Support D - V2"
